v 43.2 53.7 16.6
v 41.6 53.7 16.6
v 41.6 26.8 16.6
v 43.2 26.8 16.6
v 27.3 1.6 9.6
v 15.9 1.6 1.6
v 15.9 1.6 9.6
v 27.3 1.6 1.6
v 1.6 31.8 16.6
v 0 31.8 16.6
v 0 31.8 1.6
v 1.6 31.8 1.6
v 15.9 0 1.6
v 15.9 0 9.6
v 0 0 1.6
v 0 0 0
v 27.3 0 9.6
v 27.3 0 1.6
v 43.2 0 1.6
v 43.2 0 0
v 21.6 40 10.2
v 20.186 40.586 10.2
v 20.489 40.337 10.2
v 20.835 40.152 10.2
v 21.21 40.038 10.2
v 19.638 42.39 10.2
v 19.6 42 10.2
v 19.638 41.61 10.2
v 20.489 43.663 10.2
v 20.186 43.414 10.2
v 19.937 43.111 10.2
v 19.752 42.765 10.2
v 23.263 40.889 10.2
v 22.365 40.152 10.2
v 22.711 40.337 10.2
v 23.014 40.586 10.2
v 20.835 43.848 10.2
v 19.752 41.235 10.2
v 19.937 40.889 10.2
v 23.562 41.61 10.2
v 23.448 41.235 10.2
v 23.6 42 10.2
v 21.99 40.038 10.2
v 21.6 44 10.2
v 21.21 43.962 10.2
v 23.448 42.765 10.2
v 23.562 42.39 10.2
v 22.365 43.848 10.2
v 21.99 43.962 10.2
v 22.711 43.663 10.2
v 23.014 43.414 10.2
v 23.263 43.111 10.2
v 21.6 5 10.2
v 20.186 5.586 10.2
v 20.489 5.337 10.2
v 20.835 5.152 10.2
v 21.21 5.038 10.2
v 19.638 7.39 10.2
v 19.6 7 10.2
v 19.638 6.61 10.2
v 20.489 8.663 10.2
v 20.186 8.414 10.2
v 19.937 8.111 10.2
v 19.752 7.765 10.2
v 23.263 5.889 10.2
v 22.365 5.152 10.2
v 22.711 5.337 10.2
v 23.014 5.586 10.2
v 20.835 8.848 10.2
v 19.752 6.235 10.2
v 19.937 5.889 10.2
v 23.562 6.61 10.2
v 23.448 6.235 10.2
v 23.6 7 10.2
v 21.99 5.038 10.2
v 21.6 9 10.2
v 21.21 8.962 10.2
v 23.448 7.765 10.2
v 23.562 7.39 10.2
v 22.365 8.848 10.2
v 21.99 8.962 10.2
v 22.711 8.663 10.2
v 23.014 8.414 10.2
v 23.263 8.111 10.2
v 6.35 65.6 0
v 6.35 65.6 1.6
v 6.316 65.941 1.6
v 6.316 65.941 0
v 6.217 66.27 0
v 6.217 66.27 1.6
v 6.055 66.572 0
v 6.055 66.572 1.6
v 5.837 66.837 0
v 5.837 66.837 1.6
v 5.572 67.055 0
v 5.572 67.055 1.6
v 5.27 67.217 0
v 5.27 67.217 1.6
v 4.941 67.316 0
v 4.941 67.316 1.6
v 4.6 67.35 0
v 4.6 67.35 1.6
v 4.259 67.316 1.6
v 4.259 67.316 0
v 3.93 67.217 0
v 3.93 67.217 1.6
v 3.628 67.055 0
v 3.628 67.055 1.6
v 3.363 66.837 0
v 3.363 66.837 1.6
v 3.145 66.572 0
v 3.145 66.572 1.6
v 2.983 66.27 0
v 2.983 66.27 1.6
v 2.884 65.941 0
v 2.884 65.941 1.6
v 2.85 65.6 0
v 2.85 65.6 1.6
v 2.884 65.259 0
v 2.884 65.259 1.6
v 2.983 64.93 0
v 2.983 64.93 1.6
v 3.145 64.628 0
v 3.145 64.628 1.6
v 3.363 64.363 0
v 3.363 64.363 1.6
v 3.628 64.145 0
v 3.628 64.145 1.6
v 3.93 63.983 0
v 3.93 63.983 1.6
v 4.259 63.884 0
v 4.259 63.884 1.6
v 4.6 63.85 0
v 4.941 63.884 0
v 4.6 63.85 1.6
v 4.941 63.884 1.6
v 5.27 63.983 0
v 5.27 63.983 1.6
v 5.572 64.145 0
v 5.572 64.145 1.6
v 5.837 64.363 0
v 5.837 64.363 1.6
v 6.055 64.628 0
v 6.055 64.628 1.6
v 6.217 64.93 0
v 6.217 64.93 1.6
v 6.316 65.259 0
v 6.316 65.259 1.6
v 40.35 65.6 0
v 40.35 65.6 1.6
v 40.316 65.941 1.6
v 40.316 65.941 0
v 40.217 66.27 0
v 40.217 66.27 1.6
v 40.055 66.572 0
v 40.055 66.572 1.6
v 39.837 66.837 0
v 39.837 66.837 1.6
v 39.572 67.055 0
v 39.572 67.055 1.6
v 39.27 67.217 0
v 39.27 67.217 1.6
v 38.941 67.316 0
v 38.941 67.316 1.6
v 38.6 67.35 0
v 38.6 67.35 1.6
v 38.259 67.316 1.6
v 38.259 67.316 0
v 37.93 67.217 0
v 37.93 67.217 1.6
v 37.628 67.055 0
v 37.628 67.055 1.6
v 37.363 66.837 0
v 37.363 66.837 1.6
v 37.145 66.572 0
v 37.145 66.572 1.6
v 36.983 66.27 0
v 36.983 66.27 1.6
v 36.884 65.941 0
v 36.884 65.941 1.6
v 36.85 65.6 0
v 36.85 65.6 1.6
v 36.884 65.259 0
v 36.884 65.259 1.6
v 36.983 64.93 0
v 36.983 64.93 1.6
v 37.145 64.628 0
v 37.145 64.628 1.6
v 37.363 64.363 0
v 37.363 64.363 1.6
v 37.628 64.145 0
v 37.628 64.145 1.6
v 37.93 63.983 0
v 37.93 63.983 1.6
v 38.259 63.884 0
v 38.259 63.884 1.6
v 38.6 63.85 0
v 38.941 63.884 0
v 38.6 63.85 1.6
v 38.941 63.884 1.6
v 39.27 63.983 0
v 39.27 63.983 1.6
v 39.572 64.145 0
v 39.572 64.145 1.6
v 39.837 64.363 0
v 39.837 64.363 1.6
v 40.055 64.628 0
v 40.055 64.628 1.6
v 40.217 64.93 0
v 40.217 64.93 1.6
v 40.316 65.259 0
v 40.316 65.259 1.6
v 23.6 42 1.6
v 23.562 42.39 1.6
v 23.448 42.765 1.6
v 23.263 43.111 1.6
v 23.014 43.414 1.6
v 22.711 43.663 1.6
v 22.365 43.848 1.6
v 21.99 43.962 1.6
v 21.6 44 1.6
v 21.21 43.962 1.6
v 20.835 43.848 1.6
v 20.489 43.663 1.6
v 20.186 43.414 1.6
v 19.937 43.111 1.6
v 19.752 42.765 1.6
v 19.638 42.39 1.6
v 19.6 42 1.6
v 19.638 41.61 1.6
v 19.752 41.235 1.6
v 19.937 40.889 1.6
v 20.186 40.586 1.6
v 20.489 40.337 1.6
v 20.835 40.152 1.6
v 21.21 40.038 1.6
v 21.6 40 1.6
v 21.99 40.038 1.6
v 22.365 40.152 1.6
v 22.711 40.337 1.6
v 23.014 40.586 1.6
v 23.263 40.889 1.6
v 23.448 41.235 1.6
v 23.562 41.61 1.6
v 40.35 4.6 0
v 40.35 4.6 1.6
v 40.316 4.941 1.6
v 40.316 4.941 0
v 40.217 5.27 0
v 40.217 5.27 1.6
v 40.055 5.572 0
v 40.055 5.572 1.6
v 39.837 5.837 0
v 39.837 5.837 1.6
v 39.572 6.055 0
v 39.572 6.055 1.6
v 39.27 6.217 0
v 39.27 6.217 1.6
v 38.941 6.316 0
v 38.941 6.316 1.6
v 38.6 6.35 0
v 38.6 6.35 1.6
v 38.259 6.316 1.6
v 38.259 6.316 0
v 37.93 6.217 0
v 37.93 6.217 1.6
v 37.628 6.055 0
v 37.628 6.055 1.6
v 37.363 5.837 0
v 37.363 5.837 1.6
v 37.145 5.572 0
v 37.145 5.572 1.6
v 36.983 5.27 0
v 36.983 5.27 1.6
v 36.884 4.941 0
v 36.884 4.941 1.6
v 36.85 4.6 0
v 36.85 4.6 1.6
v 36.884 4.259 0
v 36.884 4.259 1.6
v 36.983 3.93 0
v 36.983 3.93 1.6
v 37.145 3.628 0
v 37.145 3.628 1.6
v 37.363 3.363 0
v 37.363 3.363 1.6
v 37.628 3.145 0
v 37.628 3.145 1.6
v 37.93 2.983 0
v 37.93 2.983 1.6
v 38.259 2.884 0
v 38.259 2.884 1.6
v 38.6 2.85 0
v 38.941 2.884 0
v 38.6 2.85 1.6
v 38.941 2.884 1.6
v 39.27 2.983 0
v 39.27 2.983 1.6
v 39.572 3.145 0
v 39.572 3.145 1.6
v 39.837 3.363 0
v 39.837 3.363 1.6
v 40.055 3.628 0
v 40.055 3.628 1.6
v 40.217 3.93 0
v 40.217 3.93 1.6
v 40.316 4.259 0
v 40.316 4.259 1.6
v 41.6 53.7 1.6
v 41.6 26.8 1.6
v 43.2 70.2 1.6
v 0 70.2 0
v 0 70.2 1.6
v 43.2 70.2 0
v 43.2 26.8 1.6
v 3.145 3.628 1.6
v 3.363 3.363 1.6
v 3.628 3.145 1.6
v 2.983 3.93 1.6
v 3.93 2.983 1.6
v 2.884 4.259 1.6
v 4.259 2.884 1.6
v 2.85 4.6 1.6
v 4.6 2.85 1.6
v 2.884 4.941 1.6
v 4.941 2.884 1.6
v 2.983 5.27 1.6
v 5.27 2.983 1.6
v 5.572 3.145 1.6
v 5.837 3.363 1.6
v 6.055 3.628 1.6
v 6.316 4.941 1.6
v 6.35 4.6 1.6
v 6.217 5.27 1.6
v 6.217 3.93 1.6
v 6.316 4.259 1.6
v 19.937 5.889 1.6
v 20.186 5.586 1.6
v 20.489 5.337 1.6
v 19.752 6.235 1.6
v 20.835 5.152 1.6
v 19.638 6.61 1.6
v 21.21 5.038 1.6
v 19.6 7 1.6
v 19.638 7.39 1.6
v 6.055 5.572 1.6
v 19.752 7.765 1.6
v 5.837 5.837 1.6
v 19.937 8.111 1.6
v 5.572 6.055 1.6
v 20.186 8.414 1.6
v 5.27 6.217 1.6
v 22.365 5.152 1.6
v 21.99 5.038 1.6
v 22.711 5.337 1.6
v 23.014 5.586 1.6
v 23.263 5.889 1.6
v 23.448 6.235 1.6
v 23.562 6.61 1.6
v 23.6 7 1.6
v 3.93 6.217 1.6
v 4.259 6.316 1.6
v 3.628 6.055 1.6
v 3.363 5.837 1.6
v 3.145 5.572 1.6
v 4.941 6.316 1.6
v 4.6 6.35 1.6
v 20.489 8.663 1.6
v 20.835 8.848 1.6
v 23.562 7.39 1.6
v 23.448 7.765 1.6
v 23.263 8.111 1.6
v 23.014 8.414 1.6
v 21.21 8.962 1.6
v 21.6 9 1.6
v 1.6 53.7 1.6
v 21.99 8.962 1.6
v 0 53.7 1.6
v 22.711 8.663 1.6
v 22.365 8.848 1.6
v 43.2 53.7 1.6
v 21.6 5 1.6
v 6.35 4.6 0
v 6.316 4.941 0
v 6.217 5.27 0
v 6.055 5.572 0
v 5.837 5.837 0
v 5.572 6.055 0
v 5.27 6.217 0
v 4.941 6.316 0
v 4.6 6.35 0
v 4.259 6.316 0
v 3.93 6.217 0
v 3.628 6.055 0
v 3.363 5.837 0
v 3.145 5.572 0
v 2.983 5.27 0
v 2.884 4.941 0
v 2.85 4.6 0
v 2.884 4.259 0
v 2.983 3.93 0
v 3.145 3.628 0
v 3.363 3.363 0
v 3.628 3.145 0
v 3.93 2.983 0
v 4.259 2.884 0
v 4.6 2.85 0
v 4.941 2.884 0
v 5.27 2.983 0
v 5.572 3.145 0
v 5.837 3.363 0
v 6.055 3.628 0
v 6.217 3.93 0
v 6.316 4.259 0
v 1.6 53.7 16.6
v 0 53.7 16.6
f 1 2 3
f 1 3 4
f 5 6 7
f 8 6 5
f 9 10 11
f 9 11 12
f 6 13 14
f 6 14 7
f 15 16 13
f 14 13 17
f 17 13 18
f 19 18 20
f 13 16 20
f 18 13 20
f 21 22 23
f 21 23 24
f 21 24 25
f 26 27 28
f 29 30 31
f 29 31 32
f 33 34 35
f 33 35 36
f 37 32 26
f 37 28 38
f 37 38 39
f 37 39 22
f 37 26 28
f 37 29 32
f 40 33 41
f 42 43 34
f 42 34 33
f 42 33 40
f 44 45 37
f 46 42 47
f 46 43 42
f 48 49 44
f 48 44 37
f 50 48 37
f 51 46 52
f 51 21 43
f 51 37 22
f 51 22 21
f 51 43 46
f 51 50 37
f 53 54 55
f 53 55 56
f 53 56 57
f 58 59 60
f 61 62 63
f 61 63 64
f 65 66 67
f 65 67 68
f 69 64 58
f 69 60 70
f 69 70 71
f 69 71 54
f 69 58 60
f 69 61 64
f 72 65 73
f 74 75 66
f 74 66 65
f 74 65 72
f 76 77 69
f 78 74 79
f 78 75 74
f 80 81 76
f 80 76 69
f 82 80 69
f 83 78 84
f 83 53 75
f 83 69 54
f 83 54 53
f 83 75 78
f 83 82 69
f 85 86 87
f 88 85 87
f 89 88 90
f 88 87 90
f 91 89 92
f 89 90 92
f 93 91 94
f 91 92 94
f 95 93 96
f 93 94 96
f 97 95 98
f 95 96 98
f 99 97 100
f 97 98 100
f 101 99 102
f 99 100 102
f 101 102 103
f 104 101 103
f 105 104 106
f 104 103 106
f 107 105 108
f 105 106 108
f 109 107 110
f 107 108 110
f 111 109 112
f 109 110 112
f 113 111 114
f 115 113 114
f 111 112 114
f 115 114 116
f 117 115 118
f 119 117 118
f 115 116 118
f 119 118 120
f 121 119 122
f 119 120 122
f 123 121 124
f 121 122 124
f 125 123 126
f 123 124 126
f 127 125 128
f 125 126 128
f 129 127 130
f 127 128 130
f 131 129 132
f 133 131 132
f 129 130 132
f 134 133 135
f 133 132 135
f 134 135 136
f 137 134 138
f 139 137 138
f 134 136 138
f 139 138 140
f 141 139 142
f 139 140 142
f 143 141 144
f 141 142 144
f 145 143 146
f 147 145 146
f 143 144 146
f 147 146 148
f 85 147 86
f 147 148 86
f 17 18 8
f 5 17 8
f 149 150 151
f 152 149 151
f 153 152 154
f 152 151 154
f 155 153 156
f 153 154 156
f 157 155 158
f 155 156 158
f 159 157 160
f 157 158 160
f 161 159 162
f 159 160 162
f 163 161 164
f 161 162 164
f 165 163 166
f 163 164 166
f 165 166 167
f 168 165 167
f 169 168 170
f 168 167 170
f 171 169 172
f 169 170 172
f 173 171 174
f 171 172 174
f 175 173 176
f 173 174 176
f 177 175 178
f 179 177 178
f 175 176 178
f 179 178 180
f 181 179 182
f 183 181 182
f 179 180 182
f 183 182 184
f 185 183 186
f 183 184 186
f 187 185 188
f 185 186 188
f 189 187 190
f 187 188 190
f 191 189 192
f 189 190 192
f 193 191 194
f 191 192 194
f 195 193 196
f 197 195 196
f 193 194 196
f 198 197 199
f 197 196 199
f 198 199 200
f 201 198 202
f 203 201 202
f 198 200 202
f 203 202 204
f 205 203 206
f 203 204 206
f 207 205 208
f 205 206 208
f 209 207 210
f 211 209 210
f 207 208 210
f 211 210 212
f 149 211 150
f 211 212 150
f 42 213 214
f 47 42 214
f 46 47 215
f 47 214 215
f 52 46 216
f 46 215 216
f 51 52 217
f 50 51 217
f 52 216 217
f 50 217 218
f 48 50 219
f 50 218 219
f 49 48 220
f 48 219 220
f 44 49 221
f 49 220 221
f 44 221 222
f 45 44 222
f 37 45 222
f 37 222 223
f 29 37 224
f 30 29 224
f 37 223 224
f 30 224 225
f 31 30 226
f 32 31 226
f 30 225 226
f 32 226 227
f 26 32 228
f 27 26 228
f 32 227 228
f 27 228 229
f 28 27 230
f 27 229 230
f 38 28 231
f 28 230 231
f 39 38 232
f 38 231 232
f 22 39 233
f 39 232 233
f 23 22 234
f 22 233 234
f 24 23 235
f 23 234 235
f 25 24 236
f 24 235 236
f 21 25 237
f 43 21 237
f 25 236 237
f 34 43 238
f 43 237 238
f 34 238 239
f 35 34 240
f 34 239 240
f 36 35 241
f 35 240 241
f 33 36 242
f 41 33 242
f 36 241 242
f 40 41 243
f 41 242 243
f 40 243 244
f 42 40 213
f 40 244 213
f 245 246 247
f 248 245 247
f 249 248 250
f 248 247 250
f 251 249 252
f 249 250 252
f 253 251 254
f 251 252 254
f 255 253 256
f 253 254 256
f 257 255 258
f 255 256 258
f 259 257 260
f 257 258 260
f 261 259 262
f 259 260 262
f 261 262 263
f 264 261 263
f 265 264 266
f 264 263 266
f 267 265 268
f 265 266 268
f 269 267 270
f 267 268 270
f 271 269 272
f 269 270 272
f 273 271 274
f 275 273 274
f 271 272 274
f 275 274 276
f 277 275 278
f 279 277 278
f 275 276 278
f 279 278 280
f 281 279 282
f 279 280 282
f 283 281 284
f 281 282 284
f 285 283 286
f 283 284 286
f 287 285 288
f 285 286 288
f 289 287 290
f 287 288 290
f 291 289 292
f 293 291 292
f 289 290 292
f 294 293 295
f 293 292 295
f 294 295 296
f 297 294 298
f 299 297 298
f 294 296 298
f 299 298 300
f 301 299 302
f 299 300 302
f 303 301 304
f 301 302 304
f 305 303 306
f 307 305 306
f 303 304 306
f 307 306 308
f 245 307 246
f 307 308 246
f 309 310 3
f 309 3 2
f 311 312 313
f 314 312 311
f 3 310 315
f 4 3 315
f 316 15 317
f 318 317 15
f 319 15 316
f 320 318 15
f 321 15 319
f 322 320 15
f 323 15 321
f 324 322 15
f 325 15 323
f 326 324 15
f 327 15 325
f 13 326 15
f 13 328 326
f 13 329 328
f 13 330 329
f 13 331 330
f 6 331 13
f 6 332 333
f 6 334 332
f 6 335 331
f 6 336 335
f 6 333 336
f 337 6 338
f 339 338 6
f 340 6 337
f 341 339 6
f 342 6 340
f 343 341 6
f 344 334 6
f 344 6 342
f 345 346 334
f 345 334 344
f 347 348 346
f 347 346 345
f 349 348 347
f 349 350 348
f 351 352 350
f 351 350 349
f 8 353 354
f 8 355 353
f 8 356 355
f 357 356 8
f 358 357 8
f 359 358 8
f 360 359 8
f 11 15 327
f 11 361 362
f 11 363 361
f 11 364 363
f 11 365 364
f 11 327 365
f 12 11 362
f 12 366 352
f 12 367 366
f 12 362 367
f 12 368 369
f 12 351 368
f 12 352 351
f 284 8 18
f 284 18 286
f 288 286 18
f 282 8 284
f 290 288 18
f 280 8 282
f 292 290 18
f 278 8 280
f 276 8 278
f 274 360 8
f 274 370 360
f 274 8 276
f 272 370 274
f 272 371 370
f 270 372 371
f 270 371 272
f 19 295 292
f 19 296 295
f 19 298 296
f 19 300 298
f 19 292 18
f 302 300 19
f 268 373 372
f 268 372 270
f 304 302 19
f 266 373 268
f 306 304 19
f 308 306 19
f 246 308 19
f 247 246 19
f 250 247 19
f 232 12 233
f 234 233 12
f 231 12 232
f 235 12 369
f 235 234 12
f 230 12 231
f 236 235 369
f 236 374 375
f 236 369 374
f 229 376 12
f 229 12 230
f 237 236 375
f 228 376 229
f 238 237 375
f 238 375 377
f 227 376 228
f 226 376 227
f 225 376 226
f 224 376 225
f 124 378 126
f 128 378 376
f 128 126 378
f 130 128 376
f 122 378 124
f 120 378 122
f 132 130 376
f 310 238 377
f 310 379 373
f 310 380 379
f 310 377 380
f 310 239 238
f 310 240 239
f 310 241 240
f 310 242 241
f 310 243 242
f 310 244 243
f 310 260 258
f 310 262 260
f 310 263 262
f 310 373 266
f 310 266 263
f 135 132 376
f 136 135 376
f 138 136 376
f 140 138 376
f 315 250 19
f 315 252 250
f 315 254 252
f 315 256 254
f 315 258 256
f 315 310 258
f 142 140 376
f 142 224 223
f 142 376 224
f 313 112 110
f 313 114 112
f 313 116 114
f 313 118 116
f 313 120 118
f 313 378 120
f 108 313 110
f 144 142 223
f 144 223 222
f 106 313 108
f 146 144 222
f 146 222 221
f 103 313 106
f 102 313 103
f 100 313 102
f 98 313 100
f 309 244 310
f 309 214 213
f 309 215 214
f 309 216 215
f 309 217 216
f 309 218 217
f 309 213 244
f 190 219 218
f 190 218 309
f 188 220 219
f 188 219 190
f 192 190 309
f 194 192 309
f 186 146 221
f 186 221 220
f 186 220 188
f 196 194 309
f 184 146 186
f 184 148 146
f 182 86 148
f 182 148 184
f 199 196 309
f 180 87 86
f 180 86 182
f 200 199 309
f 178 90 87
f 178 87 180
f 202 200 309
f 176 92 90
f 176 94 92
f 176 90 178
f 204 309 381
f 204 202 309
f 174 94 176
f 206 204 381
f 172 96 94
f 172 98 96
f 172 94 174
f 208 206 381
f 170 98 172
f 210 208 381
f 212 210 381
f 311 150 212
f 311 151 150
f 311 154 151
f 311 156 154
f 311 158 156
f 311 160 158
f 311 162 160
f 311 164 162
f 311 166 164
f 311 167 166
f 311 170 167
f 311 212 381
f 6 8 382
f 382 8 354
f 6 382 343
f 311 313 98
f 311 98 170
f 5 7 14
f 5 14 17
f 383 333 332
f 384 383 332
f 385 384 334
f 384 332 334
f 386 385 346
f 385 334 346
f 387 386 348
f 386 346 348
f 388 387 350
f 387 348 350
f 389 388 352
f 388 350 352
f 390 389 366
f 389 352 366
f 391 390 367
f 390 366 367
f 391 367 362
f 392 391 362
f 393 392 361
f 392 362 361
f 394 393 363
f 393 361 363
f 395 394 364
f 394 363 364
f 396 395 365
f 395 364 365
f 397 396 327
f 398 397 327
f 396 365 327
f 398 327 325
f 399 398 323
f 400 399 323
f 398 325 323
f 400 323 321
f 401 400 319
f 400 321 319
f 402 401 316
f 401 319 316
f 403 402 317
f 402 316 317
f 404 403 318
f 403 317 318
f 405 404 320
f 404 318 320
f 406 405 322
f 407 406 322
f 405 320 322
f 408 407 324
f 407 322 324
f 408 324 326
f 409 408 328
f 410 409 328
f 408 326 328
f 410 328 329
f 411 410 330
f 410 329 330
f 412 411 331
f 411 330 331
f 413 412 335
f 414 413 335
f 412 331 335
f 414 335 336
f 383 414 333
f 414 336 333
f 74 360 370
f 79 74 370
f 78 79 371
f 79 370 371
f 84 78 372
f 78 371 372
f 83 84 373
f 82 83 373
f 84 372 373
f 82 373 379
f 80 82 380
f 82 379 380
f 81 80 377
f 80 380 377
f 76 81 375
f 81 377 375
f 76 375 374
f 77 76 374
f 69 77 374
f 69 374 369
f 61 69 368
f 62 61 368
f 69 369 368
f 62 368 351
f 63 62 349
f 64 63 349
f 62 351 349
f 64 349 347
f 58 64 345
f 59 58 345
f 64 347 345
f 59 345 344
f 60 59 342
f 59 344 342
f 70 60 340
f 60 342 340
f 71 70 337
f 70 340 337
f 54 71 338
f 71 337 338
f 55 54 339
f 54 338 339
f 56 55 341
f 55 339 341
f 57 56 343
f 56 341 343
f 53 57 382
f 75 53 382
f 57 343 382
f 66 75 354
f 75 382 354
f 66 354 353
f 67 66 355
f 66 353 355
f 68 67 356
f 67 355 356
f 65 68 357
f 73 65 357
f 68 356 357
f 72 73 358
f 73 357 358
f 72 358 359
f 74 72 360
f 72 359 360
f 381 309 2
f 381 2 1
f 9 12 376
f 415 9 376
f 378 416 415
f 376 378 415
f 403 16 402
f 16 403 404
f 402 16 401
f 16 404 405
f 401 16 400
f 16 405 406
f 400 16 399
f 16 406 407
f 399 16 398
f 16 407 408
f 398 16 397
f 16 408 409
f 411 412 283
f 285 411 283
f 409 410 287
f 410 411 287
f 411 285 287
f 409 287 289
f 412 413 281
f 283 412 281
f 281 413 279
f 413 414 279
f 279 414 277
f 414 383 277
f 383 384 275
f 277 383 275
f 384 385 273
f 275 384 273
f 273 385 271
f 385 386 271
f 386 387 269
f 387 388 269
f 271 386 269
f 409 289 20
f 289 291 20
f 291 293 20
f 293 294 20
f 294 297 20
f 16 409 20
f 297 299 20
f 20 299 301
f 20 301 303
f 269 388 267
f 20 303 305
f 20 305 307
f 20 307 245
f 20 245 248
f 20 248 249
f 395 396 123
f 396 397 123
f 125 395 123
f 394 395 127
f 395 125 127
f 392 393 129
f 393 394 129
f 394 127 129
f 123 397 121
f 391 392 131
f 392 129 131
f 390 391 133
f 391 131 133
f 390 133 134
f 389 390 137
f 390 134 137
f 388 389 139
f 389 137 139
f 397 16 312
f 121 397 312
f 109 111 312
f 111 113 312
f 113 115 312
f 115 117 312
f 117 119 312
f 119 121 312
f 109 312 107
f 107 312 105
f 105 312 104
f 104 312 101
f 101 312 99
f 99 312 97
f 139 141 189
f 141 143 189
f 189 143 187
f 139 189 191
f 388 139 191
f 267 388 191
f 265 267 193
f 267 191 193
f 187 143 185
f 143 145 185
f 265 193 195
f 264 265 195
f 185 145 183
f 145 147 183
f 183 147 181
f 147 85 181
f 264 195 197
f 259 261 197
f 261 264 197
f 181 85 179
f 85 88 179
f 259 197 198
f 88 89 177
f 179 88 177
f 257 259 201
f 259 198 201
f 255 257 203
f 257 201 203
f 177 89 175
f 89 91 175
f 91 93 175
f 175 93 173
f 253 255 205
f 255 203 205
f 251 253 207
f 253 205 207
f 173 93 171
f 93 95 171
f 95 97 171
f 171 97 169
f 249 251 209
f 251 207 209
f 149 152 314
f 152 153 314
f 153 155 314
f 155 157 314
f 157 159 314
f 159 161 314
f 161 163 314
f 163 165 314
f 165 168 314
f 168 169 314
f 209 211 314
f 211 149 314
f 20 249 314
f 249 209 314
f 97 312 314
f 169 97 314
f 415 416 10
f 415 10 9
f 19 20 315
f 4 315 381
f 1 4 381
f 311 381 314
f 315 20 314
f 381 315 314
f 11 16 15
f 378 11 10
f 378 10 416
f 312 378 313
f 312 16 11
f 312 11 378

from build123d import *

# Parameters (mm, degrees)
SKETCH_W      = 43.2
SKETCH_H      = 70.2
PAD_DEPTH     = 1.6
SKETCH007_R   = 1.75
POCKET_DEPTH  = 1.6
SKETCH008_W   = 11.4
SKETCH008_H   = 1.6
PAD001_DEPTH  = 8
SKETCH009_W   = 1.6
SKETCH009_H   = 21.9
SKETCH009_H_2 = 26.9
PAD002_DEPTH  = 15
SKETCH010_R   = 2
PAD003_DEPTH  = 8.6


with BuildPart() as part:
    # Sketch → Pad (new body)
    with BuildSketch(Plane.XY):
        with Locations((21.6, 35.1)):
            Rectangle(SKETCH_W, SKETCH_H)
    extrude(amount=PAD_DEPTH)

    # Sketch007 (on Face6 of Pad) → Pocket (cut)
    with BuildSketch(Plane.XY.offset(1.6)):
        with Locations((4.6, 4.6)):
            Circle(SKETCH007_R)
        with Locations((38.6, 4.6)):
            Circle(SKETCH007_R)
        with Locations((4.6, 65.6)):
            Circle(SKETCH007_R)
        with Locations((38.6, 65.6)):
            Circle(SKETCH007_R)
    extrude(amount=-POCKET_DEPTH, mode=Mode.SUBTRACT)

    # Sketch008 (on Face5 of Pocket) → Pad001 (join)
    with BuildSketch(Plane.XY.offset(1.6)):
        with Locations((21.6, 0.8)):
            Rectangle(SKETCH008_W, SKETCH008_H)
    extrude(amount=PAD001_DEPTH)

    # Sketch009 (on Face5 of Pad001) → Pad002 (join)
    with BuildSketch(Plane.XY.offset(1.6)):
        with Locations((0.8, 42.75)):
            Rectangle(SKETCH009_W, SKETCH009_H)
        with Locations((42.4, 40.25)):
            Rectangle(SKETCH009_W, SKETCH009_H_2)
    extrude(amount=PAD002_DEPTH)

    # Sketch010 (on Face5 of Pad002) → Pad003 (join)
    with BuildSketch(Plane.XY.offset(1.6)):
        with Locations((21.6, 42)):
            Circle(SKETCH010_R)
        with Locations((21.6, 7)):
            Circle(SKETCH010_R)
    extrude(amount=PAD003_DEPTH)


solid = part.part
